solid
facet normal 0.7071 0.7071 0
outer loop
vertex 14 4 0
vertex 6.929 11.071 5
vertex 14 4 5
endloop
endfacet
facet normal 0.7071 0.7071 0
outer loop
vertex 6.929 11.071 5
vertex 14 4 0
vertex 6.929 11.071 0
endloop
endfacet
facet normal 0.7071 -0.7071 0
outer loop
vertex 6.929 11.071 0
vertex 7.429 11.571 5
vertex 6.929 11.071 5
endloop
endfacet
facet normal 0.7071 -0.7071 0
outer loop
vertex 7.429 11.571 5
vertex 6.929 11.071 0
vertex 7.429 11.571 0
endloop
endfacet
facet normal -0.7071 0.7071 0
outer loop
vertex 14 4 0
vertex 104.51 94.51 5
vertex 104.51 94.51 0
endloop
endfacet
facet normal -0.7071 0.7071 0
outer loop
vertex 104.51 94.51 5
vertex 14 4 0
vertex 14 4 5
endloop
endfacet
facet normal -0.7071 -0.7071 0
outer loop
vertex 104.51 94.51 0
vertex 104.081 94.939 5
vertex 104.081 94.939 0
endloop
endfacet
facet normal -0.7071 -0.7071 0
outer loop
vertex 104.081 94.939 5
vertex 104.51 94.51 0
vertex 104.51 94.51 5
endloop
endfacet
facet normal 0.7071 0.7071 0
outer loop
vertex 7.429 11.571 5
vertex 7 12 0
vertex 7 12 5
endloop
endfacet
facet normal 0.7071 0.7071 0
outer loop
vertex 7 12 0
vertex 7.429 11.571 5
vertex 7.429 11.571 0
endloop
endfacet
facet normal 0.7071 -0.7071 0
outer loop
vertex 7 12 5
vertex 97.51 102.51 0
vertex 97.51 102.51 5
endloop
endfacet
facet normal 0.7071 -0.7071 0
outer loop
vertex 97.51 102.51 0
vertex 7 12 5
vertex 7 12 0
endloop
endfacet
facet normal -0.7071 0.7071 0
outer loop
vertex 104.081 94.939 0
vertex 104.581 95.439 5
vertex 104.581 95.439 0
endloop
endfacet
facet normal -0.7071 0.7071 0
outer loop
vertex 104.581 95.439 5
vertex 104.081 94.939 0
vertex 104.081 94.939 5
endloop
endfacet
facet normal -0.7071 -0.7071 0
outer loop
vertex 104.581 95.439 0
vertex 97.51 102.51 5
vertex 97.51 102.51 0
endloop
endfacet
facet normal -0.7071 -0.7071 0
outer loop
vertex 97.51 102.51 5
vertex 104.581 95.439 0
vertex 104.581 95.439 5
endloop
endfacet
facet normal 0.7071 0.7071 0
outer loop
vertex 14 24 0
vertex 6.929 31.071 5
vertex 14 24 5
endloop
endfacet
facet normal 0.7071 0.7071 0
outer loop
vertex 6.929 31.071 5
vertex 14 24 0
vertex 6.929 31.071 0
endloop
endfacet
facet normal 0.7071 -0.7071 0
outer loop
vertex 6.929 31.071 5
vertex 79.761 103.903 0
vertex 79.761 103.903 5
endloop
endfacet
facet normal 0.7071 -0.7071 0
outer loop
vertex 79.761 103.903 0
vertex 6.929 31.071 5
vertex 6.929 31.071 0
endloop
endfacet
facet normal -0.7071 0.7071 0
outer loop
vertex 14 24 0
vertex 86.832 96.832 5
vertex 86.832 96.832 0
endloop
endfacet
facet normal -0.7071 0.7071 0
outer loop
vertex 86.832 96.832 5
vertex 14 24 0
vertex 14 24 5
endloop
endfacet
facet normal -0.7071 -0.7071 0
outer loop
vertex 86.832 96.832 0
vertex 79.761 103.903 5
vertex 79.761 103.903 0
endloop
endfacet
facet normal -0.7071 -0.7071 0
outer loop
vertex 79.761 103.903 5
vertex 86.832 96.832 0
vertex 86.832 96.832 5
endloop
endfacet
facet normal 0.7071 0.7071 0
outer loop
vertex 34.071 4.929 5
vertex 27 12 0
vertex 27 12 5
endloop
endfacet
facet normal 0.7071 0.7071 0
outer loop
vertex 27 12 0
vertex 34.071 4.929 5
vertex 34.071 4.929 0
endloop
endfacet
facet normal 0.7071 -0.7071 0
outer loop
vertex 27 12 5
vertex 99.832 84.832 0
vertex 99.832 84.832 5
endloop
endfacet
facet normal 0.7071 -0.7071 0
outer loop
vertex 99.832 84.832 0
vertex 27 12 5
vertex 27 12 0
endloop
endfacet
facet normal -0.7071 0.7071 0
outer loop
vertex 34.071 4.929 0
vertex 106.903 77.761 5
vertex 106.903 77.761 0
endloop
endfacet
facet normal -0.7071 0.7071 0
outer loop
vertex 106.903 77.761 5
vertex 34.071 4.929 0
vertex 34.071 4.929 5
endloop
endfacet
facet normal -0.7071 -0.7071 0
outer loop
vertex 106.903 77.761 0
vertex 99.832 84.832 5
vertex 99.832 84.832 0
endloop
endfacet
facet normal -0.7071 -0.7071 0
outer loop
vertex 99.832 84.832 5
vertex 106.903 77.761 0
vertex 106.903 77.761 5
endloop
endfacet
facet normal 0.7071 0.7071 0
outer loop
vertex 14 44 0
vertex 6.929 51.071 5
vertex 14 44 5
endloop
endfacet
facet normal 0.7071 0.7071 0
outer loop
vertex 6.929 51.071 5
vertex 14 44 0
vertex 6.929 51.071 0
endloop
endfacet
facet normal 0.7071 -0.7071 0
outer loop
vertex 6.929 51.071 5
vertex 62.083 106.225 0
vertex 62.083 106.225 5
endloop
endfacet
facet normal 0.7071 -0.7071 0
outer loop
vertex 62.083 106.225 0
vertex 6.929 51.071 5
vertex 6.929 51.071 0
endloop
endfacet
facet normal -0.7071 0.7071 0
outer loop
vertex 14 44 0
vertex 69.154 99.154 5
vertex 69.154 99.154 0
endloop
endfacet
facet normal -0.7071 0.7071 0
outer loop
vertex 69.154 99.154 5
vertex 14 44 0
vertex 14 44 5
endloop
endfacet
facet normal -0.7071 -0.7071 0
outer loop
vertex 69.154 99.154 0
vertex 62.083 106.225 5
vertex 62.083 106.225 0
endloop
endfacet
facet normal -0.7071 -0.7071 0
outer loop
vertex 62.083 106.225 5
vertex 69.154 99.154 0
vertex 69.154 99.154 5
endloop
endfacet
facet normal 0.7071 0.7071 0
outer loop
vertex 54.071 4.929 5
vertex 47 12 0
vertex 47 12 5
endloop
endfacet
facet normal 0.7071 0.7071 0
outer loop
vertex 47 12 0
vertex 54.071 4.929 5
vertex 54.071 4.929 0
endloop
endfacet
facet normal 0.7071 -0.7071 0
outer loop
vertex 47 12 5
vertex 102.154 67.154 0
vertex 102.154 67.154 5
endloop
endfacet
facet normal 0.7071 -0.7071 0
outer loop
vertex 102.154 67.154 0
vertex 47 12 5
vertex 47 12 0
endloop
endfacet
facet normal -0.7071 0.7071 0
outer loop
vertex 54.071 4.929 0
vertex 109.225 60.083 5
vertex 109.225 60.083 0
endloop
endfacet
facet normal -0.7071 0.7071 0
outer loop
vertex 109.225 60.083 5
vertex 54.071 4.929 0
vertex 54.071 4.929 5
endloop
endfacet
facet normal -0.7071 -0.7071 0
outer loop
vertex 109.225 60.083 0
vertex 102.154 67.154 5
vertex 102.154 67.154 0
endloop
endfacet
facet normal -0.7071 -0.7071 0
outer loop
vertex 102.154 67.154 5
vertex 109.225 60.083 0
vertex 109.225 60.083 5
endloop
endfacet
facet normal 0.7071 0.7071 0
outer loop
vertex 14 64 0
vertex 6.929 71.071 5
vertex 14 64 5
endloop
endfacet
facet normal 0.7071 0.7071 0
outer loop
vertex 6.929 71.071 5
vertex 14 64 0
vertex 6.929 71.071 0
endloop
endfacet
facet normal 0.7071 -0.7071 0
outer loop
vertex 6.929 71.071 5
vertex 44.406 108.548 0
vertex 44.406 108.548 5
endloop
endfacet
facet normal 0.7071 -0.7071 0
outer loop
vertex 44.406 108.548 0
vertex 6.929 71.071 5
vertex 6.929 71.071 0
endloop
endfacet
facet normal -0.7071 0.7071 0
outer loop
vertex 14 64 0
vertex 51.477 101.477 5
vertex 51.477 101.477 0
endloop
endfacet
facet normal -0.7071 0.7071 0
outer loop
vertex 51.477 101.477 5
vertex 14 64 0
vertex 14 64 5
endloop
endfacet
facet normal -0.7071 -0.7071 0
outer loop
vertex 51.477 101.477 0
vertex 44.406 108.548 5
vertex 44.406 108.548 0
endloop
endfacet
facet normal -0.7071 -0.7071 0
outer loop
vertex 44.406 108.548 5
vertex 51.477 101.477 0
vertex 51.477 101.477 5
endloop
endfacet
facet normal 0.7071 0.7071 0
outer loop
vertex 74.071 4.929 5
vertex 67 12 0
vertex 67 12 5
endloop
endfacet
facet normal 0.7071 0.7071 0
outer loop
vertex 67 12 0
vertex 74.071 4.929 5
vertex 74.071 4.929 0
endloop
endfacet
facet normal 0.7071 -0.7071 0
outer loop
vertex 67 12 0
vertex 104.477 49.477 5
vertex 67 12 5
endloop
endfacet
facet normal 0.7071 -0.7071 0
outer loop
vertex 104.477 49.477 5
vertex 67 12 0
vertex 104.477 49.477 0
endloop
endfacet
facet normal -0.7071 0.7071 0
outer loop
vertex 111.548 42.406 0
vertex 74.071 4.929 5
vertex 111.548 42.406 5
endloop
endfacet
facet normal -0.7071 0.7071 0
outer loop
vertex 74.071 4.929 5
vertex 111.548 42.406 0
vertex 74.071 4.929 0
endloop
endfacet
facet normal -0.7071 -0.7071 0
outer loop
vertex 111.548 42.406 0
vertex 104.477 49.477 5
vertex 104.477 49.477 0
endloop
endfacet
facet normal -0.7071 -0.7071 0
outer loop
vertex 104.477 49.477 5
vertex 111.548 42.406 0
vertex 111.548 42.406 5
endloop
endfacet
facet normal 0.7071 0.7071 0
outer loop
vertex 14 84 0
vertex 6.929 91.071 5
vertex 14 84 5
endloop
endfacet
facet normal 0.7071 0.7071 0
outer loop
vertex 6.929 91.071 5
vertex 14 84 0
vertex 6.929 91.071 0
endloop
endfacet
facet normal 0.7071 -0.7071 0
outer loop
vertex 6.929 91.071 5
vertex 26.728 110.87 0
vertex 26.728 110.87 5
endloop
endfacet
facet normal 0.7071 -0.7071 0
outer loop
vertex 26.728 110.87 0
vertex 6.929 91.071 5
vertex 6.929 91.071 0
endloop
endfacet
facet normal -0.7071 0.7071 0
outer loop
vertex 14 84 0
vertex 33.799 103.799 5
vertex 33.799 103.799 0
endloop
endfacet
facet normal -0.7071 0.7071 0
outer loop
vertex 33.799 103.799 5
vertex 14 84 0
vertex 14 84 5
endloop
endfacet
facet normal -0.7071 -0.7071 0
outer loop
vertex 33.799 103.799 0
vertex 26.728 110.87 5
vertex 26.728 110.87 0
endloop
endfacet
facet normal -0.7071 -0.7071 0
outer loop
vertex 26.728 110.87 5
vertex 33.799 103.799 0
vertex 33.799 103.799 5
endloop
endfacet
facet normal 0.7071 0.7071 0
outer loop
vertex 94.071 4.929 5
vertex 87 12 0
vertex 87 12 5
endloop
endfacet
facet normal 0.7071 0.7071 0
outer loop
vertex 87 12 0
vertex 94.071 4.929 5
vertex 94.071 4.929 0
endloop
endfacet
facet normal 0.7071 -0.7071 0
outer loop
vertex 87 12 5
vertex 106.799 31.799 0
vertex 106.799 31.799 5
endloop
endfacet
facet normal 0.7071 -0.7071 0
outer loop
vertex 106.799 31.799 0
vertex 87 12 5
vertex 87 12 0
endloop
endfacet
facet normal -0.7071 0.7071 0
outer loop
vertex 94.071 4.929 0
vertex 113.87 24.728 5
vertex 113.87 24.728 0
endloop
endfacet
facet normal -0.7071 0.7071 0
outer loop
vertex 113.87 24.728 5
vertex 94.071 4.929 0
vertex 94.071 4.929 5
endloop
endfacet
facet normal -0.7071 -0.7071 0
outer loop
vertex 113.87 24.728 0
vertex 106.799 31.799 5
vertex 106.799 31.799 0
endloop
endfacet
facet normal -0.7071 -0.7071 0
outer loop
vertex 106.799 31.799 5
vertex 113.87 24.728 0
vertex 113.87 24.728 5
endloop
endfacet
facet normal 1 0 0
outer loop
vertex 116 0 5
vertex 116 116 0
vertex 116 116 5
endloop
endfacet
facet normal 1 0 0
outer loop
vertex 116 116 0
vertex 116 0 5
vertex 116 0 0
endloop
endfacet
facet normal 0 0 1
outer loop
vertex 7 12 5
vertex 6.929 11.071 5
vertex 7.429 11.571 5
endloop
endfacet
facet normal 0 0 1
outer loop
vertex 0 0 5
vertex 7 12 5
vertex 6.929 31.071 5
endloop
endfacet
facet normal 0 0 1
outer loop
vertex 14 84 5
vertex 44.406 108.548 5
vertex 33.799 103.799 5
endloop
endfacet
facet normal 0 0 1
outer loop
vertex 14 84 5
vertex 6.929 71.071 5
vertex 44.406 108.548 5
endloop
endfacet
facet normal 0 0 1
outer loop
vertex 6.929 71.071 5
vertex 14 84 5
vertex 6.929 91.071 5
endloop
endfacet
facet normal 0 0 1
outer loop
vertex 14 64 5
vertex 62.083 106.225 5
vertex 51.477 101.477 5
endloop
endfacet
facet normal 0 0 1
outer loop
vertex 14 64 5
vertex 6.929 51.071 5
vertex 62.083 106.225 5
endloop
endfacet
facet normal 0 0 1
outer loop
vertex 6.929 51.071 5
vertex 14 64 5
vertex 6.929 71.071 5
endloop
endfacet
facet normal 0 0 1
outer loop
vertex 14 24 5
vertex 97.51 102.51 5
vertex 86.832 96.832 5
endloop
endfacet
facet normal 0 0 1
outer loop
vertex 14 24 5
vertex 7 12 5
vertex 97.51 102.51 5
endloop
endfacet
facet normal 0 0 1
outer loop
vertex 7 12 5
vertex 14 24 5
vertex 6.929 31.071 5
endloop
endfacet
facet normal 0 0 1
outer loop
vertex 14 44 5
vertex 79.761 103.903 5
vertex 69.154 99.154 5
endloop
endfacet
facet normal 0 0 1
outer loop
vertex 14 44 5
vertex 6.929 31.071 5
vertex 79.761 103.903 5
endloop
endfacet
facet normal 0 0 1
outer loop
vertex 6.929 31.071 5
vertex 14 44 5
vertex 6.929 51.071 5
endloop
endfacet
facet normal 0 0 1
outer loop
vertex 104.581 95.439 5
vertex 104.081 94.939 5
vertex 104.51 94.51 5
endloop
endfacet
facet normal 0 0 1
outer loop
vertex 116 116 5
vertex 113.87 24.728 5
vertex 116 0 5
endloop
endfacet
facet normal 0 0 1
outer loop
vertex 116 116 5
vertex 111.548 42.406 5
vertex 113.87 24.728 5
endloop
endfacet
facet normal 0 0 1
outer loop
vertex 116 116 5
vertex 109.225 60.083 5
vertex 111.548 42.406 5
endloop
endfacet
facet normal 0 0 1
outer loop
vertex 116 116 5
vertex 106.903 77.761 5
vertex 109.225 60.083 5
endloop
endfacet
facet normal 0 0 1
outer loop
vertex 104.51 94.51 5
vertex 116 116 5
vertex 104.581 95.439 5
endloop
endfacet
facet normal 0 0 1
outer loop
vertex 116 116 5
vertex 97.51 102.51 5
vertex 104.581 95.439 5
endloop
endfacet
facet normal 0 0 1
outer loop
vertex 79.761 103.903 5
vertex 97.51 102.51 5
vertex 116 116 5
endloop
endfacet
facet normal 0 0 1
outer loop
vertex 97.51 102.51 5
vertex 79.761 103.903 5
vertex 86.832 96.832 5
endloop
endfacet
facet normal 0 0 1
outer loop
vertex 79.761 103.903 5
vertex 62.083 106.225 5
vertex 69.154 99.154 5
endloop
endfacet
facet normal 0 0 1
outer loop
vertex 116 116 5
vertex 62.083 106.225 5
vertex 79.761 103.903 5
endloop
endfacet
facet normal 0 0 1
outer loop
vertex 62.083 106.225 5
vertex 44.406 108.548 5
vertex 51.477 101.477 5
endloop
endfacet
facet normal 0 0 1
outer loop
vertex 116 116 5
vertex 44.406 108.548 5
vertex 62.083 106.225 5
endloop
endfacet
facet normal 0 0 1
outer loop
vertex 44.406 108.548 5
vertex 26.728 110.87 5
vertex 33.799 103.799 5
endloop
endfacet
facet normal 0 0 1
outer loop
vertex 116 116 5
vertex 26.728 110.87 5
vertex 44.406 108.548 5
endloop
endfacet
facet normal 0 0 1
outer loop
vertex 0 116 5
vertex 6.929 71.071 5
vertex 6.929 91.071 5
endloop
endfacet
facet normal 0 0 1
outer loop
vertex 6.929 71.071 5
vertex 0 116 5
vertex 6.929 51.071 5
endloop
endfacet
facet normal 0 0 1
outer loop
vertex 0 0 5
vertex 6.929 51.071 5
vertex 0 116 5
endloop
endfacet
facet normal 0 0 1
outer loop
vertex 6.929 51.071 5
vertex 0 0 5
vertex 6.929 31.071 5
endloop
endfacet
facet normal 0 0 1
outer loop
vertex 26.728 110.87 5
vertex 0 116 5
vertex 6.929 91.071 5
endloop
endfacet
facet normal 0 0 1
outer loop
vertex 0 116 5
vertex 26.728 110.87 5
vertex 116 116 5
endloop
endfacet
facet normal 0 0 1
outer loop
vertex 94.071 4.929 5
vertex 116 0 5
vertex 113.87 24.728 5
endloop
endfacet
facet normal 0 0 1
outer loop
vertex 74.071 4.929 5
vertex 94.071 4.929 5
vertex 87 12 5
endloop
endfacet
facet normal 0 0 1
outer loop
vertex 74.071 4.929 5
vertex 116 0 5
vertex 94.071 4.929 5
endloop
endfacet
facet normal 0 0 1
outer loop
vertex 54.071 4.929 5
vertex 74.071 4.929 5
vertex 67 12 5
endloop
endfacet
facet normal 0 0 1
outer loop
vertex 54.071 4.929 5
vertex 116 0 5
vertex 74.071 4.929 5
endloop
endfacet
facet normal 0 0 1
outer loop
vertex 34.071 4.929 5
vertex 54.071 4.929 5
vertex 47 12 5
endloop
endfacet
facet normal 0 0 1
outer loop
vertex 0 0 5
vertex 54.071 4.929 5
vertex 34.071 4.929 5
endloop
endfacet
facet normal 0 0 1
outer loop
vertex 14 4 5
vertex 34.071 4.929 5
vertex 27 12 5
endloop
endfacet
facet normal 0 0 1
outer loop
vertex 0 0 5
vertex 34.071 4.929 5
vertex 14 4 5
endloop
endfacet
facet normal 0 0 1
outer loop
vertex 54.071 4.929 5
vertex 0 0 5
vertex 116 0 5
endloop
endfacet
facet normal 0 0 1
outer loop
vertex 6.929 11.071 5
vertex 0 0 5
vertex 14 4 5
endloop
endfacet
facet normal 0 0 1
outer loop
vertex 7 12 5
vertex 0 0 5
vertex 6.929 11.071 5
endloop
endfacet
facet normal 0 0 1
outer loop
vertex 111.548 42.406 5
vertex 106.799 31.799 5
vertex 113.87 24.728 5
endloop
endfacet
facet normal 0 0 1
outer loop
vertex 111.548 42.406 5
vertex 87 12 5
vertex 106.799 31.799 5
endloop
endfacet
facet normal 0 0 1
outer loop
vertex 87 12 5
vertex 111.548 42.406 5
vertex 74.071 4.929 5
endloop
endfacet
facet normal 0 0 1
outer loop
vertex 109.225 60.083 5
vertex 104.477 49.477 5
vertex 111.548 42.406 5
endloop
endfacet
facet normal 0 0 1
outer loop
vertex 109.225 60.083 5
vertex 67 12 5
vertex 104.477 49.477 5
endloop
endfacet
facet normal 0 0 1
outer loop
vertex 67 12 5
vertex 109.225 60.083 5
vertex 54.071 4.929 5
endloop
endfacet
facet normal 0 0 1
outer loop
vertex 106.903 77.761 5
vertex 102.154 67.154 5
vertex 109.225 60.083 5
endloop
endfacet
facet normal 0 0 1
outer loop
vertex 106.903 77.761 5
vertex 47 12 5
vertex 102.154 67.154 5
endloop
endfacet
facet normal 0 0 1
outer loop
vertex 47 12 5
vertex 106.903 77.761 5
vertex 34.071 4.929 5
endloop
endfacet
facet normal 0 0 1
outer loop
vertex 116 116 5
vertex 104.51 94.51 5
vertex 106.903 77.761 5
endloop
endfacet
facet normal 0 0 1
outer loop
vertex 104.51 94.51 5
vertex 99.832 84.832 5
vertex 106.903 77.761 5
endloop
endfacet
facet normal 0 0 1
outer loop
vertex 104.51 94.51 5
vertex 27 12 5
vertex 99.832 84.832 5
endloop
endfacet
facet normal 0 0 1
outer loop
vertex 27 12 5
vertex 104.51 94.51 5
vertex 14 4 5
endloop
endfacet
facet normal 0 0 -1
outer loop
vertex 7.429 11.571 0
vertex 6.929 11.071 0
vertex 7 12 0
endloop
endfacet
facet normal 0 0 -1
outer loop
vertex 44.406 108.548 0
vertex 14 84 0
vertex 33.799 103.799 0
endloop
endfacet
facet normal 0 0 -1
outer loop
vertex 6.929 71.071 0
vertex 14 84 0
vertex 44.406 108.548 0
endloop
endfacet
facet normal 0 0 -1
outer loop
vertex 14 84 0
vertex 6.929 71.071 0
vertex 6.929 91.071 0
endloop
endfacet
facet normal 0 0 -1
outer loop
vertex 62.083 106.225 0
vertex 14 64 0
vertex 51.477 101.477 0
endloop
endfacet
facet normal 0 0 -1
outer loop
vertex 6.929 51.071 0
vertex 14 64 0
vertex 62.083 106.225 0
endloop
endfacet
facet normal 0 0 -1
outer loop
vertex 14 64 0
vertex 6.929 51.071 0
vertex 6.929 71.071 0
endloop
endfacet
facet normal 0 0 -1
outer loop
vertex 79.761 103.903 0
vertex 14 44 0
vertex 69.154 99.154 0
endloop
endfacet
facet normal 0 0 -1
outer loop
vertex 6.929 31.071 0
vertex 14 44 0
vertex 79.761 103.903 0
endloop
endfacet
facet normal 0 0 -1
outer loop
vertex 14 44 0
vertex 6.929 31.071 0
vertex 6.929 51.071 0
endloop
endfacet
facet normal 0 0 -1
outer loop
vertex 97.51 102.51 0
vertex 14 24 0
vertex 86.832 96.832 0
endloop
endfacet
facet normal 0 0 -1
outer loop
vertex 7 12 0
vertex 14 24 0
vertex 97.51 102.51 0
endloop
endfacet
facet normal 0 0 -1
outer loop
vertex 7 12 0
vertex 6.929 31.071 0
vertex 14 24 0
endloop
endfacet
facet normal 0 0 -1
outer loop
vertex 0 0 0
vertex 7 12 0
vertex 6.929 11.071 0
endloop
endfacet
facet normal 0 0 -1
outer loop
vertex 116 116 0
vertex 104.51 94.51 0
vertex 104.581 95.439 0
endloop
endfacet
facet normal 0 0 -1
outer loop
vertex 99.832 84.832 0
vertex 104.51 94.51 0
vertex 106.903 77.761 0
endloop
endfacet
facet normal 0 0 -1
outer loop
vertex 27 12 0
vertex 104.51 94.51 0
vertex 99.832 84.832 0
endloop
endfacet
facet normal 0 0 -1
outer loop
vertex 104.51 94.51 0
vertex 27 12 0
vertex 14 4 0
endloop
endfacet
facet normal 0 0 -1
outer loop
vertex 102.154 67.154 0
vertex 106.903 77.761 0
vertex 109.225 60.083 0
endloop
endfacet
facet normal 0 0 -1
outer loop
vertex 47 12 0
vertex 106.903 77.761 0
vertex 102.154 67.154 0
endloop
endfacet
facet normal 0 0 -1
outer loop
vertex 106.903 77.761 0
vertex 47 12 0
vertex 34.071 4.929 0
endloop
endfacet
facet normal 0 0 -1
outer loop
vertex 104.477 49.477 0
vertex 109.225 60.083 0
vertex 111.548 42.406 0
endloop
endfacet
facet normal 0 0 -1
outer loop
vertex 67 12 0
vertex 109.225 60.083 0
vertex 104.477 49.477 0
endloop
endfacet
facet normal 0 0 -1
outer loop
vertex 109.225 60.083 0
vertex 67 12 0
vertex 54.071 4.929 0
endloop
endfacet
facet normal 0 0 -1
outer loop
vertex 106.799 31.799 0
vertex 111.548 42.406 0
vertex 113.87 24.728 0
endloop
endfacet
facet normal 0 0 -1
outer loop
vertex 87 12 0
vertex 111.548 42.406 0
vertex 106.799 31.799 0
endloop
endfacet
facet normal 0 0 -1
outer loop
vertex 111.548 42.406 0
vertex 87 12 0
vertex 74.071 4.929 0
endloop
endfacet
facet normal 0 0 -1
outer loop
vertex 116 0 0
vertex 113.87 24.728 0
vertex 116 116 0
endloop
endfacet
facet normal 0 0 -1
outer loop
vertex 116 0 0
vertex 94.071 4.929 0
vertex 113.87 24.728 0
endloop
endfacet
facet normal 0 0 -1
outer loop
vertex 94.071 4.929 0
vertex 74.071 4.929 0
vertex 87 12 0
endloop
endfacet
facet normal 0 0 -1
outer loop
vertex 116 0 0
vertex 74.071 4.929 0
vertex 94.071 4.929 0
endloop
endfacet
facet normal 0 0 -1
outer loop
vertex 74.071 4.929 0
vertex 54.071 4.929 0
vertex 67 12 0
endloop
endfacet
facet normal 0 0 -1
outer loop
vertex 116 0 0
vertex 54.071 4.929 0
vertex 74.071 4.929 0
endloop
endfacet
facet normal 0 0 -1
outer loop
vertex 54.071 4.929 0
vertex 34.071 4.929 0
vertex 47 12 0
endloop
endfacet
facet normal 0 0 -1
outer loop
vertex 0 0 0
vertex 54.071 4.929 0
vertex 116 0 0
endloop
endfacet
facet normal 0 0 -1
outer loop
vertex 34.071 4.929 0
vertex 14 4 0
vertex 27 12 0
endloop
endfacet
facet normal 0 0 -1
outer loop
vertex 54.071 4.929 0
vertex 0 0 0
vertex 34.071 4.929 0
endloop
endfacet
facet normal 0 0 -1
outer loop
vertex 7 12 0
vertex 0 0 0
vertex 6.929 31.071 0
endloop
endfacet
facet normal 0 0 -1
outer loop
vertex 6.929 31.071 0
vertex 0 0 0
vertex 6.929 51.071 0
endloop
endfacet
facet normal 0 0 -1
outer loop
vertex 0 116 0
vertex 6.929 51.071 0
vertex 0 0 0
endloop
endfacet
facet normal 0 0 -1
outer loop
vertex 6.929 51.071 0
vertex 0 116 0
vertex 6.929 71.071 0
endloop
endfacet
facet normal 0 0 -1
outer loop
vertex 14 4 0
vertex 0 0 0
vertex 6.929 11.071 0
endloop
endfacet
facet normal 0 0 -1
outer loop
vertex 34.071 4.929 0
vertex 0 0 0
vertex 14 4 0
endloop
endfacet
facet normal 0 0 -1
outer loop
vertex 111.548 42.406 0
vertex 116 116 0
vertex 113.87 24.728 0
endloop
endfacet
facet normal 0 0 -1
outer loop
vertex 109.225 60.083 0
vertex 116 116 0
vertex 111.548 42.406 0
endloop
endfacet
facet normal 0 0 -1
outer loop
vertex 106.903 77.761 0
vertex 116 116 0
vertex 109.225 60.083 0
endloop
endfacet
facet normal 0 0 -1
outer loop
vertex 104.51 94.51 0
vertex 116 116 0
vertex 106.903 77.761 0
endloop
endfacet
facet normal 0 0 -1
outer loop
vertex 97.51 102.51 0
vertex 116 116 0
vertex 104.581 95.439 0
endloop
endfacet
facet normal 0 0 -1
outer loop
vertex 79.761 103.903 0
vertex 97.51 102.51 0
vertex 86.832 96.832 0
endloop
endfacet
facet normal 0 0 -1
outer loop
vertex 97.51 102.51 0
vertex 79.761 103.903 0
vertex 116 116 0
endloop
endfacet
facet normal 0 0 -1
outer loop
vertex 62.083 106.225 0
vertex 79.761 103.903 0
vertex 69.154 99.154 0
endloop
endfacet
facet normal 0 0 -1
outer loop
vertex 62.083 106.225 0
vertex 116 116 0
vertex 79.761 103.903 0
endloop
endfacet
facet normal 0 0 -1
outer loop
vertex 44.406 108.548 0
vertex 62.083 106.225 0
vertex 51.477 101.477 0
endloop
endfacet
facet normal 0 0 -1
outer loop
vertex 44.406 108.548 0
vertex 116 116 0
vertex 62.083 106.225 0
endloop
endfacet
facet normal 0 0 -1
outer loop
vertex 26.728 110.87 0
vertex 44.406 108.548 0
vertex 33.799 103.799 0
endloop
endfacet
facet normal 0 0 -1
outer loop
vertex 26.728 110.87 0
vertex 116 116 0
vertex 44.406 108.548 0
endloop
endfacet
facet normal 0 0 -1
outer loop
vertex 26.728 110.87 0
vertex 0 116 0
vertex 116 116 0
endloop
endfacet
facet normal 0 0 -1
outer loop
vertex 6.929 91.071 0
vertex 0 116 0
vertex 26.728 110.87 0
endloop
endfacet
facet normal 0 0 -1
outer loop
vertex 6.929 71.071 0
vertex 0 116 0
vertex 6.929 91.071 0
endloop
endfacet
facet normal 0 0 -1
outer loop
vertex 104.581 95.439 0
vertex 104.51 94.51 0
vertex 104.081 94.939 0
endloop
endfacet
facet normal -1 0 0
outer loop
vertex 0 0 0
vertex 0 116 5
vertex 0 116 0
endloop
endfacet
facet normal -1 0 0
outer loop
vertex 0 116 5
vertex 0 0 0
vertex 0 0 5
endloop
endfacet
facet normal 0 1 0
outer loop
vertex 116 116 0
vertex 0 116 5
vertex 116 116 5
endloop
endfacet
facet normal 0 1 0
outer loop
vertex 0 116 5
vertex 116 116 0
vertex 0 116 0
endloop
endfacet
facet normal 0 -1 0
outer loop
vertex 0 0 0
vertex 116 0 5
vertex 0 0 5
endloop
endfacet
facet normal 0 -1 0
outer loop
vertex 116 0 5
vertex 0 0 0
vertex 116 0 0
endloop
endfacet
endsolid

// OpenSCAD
w = 116;
h = 116;
d = 5;

w1 = 153;
h1 = 10;
d1 = 12;

difference(){
    cube([w,h,d]);
for (i = [1:5]){
    color("red")
    translate([14,20*i-16,-1])
    rotate(45)
    cube([w1-(25*i),h1,d1]);
   mirror([1,-1,0])
    translate([12,20*i-13,-1])
    rotate(45)
    cube([w1-(25*i),h1,d1]);
    }
    
 

}
